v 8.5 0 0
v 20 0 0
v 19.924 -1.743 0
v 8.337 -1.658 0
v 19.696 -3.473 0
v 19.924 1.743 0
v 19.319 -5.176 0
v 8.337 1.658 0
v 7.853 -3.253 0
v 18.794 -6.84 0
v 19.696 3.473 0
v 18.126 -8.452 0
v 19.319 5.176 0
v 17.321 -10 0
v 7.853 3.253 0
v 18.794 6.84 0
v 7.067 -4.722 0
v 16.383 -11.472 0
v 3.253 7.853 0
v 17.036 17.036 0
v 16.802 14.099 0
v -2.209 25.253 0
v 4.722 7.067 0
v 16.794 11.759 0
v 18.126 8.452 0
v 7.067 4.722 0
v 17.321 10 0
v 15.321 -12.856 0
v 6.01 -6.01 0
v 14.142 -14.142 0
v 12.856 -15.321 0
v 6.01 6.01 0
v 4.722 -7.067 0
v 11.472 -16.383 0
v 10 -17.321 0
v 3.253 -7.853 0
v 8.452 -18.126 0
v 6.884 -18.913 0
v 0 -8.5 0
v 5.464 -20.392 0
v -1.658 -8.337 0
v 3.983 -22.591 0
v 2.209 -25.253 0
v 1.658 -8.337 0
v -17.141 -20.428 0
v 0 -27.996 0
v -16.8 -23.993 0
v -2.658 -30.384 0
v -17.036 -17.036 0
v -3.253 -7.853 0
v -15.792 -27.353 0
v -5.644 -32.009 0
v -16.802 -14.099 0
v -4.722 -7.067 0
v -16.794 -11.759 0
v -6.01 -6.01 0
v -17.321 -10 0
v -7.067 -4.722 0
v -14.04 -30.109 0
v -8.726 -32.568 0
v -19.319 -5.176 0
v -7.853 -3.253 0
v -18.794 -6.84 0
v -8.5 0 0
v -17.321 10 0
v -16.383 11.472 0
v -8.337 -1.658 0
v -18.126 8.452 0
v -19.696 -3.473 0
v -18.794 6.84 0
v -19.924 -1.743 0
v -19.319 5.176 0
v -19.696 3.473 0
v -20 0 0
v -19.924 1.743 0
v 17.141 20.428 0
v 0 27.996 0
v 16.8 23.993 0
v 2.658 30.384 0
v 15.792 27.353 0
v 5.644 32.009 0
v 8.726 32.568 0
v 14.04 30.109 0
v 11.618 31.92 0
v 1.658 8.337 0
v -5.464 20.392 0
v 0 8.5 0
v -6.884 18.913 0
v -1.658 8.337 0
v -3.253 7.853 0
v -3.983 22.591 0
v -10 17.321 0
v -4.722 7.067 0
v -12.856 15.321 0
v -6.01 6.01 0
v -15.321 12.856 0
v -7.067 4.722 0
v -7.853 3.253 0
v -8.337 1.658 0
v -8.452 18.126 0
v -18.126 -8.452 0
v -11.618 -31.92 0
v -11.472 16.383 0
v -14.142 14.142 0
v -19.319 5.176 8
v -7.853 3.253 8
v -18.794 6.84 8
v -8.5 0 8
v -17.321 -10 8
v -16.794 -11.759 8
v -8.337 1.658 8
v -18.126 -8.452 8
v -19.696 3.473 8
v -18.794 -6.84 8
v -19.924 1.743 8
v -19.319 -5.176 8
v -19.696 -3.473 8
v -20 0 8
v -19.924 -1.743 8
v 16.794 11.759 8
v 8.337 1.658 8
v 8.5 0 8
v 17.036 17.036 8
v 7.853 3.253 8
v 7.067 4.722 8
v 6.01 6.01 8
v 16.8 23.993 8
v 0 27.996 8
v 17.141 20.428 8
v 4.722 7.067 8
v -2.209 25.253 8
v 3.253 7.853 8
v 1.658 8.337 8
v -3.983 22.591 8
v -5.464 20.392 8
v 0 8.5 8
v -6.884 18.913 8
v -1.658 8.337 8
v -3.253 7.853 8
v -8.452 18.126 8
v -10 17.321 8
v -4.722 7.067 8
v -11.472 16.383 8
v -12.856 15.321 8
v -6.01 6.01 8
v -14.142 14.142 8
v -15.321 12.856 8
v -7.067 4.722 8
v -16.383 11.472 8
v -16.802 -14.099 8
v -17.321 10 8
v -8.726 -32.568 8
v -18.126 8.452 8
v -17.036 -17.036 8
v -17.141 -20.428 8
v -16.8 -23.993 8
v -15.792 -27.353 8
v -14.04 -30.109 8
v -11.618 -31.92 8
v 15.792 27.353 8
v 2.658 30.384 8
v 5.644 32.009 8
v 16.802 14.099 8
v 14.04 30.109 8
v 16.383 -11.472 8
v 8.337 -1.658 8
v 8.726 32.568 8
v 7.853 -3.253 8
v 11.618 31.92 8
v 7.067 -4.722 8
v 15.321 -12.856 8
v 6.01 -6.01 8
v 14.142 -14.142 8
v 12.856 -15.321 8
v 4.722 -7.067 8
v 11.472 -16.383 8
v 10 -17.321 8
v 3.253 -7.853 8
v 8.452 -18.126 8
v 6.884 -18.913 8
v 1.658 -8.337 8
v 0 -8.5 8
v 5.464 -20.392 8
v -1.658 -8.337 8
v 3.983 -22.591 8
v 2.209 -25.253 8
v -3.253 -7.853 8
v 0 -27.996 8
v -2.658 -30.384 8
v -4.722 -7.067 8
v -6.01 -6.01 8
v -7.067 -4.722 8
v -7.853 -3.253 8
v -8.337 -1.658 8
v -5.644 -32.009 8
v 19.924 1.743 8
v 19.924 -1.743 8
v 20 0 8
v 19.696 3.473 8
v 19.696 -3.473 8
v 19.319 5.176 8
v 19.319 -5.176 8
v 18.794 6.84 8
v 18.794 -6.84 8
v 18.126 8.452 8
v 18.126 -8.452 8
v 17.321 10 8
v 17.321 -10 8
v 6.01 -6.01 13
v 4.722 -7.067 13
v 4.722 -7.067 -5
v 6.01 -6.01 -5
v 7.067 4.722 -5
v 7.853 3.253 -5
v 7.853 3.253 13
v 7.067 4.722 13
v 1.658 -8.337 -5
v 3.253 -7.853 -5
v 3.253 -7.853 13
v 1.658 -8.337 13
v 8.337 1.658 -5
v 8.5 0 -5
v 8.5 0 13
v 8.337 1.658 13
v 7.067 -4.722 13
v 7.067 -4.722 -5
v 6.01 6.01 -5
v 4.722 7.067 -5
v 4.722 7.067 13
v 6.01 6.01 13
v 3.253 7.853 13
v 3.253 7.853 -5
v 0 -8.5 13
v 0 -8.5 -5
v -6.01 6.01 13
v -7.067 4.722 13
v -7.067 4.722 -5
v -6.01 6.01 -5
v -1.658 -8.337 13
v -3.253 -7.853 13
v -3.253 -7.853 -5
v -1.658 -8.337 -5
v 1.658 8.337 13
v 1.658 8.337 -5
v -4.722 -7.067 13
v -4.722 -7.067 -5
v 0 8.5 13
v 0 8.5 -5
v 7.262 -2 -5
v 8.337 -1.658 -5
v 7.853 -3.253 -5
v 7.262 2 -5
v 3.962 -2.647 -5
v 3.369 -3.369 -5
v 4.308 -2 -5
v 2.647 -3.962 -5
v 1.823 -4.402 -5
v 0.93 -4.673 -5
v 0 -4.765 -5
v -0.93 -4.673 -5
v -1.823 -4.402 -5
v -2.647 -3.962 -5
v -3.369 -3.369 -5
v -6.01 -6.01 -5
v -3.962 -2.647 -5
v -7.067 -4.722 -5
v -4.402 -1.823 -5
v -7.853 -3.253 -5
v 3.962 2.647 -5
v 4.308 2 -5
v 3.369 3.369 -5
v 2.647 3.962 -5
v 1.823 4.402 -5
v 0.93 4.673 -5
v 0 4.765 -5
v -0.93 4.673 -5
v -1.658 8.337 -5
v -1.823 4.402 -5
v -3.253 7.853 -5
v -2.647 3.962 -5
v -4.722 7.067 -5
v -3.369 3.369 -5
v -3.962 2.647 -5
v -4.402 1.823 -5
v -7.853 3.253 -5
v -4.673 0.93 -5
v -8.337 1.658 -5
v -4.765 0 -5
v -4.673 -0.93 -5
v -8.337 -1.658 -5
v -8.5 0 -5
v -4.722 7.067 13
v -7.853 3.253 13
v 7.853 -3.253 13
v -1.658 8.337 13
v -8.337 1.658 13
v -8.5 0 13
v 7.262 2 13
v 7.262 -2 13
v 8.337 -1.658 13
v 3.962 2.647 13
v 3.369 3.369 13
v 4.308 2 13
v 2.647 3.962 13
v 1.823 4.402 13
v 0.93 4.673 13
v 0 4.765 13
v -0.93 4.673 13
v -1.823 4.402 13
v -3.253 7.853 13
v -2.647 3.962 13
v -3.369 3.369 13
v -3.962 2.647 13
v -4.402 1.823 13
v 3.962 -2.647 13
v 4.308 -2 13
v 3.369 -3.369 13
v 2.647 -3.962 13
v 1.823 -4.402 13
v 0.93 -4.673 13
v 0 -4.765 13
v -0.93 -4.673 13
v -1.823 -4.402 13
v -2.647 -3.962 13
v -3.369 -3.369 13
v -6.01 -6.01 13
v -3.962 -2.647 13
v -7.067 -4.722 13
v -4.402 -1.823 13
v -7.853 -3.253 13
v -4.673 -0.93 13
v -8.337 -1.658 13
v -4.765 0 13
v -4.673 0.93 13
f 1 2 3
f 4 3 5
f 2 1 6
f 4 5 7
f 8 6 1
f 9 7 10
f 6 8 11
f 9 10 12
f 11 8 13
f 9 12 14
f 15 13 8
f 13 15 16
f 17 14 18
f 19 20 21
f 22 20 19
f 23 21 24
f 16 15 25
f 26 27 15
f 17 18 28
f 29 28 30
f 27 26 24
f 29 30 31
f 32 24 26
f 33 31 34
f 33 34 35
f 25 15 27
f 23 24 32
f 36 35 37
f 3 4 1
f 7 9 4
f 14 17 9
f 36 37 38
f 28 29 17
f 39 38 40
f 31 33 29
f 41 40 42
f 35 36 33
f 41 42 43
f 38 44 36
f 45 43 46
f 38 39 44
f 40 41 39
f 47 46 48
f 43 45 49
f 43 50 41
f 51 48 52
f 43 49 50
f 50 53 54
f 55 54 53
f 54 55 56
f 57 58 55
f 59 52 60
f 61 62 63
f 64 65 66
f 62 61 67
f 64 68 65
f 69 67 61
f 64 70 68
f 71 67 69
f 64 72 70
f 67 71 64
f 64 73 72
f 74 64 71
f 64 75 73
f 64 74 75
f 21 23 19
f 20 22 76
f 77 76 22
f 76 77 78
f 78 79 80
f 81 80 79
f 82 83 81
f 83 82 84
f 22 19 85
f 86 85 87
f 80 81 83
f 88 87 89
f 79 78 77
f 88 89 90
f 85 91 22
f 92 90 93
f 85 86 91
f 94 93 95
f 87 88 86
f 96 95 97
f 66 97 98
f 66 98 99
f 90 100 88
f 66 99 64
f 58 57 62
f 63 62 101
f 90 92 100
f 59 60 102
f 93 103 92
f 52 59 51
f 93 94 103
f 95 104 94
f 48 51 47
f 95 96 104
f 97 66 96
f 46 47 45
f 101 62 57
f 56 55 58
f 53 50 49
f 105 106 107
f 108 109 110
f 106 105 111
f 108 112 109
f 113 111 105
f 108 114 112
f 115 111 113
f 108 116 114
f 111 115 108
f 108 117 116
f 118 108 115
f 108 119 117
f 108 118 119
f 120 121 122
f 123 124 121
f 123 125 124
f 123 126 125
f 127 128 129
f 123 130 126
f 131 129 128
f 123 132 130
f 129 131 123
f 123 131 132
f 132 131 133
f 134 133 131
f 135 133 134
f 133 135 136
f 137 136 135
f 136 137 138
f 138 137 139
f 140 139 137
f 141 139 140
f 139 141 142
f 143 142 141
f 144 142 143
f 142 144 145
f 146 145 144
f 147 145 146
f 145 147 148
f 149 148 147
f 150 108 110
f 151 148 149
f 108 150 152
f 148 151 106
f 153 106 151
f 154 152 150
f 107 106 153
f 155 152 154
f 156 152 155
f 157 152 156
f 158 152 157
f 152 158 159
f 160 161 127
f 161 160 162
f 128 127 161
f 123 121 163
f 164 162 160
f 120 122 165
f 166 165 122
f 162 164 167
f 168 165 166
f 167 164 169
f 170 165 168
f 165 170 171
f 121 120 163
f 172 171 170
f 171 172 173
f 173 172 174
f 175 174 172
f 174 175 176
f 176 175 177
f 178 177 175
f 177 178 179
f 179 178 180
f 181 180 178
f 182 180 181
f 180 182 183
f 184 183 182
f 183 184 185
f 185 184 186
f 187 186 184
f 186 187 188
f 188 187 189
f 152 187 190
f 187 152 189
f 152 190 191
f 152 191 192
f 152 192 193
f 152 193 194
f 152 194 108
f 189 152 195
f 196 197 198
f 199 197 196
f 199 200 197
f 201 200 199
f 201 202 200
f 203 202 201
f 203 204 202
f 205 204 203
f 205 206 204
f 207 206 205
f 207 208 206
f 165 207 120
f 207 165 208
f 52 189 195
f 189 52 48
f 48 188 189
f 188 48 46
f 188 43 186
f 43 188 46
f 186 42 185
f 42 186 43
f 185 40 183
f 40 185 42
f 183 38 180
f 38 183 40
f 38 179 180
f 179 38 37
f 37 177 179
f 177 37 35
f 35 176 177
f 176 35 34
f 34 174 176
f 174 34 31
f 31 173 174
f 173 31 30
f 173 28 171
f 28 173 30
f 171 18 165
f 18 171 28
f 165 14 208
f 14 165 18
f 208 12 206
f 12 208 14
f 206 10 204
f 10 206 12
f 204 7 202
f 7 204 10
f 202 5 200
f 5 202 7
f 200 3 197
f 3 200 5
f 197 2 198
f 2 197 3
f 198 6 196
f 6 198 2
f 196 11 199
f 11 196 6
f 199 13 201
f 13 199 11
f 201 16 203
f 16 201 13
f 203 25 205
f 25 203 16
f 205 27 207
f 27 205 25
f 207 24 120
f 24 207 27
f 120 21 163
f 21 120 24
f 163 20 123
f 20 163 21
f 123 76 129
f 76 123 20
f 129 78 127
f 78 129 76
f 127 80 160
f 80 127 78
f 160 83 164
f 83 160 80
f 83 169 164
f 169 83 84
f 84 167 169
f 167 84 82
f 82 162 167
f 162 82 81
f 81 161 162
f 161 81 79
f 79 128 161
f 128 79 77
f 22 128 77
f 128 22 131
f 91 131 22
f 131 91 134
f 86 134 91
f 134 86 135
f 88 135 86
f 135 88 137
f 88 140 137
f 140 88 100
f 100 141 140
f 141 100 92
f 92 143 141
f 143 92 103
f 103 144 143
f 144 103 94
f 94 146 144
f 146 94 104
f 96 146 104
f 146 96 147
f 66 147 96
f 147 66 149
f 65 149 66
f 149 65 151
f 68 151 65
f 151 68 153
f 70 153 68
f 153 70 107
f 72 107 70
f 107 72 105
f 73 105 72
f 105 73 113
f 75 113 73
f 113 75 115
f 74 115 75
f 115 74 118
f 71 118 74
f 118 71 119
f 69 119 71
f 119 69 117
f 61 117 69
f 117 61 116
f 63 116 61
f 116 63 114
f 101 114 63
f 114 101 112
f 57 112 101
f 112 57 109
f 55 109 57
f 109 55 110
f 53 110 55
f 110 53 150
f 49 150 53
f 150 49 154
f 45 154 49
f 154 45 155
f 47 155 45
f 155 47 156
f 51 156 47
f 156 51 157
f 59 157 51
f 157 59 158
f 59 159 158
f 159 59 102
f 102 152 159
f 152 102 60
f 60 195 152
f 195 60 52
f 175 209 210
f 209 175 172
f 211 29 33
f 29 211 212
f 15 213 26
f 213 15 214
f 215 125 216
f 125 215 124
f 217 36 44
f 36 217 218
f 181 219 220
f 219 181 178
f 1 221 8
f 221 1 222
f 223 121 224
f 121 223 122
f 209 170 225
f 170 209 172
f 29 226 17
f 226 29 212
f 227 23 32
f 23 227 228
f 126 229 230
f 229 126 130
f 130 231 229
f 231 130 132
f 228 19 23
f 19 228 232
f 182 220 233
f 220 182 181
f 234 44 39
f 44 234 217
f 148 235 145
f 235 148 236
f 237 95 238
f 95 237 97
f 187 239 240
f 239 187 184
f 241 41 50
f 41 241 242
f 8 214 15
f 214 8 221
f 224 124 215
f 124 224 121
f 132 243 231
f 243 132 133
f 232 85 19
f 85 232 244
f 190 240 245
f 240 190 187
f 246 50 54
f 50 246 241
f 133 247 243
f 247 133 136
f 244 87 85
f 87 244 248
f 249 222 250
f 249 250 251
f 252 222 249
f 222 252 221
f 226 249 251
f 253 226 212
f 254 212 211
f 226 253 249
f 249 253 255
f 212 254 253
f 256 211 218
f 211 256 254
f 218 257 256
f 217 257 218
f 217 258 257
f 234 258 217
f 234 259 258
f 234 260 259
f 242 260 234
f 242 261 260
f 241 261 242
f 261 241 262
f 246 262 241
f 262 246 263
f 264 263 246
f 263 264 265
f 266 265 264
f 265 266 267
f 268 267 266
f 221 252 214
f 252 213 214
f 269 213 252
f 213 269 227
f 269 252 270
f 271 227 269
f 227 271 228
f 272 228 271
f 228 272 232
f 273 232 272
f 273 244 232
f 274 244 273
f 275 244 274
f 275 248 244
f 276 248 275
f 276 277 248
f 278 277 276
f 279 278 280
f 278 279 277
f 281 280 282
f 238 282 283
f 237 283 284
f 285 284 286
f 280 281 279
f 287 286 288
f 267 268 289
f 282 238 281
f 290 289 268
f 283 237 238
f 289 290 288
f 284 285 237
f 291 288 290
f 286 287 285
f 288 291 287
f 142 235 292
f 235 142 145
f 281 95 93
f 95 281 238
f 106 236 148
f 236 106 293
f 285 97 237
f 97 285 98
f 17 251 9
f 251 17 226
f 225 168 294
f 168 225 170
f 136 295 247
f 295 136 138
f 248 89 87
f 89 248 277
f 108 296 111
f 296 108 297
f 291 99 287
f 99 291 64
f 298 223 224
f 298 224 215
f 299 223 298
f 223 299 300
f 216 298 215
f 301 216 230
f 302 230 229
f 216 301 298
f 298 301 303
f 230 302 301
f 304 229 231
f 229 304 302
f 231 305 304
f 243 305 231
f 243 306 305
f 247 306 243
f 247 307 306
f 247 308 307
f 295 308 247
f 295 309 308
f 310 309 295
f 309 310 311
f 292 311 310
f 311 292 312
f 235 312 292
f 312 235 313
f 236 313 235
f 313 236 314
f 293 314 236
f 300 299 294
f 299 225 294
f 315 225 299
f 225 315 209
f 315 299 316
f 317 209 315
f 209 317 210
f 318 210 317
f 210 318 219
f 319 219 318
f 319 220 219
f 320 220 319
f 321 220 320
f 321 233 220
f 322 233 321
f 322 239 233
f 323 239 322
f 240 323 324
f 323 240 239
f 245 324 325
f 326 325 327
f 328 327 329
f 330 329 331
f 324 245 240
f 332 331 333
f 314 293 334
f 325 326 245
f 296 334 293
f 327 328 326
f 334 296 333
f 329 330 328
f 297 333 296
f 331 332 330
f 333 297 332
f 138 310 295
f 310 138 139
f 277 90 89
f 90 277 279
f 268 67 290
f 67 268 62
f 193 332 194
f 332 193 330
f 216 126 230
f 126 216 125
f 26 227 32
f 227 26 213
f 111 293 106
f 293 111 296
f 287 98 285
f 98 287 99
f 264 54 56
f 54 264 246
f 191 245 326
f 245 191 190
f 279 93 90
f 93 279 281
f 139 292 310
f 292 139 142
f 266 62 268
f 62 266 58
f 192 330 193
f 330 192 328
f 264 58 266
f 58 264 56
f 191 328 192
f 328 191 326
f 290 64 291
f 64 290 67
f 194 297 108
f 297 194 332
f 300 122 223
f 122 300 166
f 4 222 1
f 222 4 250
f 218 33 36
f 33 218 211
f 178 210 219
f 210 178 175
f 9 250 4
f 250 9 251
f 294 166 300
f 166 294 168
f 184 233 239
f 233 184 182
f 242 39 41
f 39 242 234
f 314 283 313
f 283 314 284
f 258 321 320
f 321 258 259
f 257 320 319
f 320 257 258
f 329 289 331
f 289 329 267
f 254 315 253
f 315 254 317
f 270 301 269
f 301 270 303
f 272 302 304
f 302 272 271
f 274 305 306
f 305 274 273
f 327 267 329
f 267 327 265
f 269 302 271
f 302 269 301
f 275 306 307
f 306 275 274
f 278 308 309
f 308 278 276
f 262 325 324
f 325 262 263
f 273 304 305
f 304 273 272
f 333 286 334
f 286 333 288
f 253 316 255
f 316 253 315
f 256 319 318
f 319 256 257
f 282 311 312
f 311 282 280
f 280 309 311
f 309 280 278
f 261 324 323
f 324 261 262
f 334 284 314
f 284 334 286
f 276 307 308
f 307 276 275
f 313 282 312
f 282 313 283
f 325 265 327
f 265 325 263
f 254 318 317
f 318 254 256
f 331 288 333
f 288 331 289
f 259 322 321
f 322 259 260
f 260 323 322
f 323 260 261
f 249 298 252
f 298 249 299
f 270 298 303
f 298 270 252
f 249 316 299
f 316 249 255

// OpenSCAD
$fn = 32;
// ----------------------------------------------------------------------
// Cam: base radius 20 mm with a 14 mm lift over 150 degrees
// ----------------------------------------------------------------------

// --- parameters (mm) ---
base_r = 20;              // base radius
lift = 14;                // lift height above the base radius
lift_span = 150;          // angular width of the lift
lift_start = 30;          // angle where the lift starts
cam_t = 8;                // cam plate thickness
hub_d = 17;               // hub diameter
hub_h = 18;               // hub height
bore_d = 9.53;            // bore
key_w = 4;                // keyway width
key_depth = 1.74;         // keyway depth

cam_profile = [[20, 0], [19.924, 1.743], [19.696, 3.473], [19.319, 5.176], [18.794, 6.84], [18.126, 8.452], [17.321, 10], [16.794, 11.759], [16.802, 14.099], [17.036, 17.036], [17.141, 20.428], [16.8, 23.993], [15.792, 27.353], [14.04, 30.109], [11.618, 31.92], [8.726, 32.568], [5.644, 32.009], [2.658, 30.384], [0, 27.996], [-2.209, 25.253], [-3.983, 22.591], [-5.464, 20.392], [-6.884, 18.913], [-8.452, 18.126], [-10, 17.321], [-11.472, 16.383], [-12.856, 15.321], [-14.142, 14.142], [-15.321, 12.856], [-16.383, 11.472], [-17.321, 10], [-18.126, 8.452], [-18.794, 6.84], [-19.319, 5.176], [-19.696, 3.473], [-19.924, 1.743], [-20, 0], [-19.924, -1.743], [-19.696, -3.473], [-19.319, -5.176], [-18.794, -6.84], [-18.126, -8.452], [-17.321, -10], [-16.794, -11.759], [-16.802, -14.099], [-17.036, -17.036], [-17.141, -20.428], [-16.8, -23.993], [-15.792, -27.353], [-14.04, -30.109], [-11.618, -31.92], [-8.726, -32.568], [-5.644, -32.009], [-2.658, -30.384], [0, -27.996], [2.209, -25.253], [3.983, -22.591], [5.464, -20.392], [6.884, -18.913], [8.452, -18.126], [10, -17.321], [11.472, -16.383], [12.856, -15.321], [14.142, -14.142], [15.321, -12.856], [16.383, -11.472], [17.321, -10], [18.126, -8.452], [18.794, -6.84], [19.319, -5.176], [19.696, -3.473], [19.924, -1.743]];

difference() {
  union() {
    linear_extrude(height = cam_t) polygon(cam_profile);
    /* hub, proud of the cam plate on both sides */
    translate([0, 0, -5]) cylinder(h = hub_h, d = hub_d);
  }
  /* bore through the hub, 2.5 mm clear on both faces */
  translate([0, 0, -7.5]) cylinder(h = hub_h + 5, d = bore_d);
  /* keyway, milled through the whole hub */
  translate([3.022, -2, -7.5]) cube([4.24, 4, 23]);
}
